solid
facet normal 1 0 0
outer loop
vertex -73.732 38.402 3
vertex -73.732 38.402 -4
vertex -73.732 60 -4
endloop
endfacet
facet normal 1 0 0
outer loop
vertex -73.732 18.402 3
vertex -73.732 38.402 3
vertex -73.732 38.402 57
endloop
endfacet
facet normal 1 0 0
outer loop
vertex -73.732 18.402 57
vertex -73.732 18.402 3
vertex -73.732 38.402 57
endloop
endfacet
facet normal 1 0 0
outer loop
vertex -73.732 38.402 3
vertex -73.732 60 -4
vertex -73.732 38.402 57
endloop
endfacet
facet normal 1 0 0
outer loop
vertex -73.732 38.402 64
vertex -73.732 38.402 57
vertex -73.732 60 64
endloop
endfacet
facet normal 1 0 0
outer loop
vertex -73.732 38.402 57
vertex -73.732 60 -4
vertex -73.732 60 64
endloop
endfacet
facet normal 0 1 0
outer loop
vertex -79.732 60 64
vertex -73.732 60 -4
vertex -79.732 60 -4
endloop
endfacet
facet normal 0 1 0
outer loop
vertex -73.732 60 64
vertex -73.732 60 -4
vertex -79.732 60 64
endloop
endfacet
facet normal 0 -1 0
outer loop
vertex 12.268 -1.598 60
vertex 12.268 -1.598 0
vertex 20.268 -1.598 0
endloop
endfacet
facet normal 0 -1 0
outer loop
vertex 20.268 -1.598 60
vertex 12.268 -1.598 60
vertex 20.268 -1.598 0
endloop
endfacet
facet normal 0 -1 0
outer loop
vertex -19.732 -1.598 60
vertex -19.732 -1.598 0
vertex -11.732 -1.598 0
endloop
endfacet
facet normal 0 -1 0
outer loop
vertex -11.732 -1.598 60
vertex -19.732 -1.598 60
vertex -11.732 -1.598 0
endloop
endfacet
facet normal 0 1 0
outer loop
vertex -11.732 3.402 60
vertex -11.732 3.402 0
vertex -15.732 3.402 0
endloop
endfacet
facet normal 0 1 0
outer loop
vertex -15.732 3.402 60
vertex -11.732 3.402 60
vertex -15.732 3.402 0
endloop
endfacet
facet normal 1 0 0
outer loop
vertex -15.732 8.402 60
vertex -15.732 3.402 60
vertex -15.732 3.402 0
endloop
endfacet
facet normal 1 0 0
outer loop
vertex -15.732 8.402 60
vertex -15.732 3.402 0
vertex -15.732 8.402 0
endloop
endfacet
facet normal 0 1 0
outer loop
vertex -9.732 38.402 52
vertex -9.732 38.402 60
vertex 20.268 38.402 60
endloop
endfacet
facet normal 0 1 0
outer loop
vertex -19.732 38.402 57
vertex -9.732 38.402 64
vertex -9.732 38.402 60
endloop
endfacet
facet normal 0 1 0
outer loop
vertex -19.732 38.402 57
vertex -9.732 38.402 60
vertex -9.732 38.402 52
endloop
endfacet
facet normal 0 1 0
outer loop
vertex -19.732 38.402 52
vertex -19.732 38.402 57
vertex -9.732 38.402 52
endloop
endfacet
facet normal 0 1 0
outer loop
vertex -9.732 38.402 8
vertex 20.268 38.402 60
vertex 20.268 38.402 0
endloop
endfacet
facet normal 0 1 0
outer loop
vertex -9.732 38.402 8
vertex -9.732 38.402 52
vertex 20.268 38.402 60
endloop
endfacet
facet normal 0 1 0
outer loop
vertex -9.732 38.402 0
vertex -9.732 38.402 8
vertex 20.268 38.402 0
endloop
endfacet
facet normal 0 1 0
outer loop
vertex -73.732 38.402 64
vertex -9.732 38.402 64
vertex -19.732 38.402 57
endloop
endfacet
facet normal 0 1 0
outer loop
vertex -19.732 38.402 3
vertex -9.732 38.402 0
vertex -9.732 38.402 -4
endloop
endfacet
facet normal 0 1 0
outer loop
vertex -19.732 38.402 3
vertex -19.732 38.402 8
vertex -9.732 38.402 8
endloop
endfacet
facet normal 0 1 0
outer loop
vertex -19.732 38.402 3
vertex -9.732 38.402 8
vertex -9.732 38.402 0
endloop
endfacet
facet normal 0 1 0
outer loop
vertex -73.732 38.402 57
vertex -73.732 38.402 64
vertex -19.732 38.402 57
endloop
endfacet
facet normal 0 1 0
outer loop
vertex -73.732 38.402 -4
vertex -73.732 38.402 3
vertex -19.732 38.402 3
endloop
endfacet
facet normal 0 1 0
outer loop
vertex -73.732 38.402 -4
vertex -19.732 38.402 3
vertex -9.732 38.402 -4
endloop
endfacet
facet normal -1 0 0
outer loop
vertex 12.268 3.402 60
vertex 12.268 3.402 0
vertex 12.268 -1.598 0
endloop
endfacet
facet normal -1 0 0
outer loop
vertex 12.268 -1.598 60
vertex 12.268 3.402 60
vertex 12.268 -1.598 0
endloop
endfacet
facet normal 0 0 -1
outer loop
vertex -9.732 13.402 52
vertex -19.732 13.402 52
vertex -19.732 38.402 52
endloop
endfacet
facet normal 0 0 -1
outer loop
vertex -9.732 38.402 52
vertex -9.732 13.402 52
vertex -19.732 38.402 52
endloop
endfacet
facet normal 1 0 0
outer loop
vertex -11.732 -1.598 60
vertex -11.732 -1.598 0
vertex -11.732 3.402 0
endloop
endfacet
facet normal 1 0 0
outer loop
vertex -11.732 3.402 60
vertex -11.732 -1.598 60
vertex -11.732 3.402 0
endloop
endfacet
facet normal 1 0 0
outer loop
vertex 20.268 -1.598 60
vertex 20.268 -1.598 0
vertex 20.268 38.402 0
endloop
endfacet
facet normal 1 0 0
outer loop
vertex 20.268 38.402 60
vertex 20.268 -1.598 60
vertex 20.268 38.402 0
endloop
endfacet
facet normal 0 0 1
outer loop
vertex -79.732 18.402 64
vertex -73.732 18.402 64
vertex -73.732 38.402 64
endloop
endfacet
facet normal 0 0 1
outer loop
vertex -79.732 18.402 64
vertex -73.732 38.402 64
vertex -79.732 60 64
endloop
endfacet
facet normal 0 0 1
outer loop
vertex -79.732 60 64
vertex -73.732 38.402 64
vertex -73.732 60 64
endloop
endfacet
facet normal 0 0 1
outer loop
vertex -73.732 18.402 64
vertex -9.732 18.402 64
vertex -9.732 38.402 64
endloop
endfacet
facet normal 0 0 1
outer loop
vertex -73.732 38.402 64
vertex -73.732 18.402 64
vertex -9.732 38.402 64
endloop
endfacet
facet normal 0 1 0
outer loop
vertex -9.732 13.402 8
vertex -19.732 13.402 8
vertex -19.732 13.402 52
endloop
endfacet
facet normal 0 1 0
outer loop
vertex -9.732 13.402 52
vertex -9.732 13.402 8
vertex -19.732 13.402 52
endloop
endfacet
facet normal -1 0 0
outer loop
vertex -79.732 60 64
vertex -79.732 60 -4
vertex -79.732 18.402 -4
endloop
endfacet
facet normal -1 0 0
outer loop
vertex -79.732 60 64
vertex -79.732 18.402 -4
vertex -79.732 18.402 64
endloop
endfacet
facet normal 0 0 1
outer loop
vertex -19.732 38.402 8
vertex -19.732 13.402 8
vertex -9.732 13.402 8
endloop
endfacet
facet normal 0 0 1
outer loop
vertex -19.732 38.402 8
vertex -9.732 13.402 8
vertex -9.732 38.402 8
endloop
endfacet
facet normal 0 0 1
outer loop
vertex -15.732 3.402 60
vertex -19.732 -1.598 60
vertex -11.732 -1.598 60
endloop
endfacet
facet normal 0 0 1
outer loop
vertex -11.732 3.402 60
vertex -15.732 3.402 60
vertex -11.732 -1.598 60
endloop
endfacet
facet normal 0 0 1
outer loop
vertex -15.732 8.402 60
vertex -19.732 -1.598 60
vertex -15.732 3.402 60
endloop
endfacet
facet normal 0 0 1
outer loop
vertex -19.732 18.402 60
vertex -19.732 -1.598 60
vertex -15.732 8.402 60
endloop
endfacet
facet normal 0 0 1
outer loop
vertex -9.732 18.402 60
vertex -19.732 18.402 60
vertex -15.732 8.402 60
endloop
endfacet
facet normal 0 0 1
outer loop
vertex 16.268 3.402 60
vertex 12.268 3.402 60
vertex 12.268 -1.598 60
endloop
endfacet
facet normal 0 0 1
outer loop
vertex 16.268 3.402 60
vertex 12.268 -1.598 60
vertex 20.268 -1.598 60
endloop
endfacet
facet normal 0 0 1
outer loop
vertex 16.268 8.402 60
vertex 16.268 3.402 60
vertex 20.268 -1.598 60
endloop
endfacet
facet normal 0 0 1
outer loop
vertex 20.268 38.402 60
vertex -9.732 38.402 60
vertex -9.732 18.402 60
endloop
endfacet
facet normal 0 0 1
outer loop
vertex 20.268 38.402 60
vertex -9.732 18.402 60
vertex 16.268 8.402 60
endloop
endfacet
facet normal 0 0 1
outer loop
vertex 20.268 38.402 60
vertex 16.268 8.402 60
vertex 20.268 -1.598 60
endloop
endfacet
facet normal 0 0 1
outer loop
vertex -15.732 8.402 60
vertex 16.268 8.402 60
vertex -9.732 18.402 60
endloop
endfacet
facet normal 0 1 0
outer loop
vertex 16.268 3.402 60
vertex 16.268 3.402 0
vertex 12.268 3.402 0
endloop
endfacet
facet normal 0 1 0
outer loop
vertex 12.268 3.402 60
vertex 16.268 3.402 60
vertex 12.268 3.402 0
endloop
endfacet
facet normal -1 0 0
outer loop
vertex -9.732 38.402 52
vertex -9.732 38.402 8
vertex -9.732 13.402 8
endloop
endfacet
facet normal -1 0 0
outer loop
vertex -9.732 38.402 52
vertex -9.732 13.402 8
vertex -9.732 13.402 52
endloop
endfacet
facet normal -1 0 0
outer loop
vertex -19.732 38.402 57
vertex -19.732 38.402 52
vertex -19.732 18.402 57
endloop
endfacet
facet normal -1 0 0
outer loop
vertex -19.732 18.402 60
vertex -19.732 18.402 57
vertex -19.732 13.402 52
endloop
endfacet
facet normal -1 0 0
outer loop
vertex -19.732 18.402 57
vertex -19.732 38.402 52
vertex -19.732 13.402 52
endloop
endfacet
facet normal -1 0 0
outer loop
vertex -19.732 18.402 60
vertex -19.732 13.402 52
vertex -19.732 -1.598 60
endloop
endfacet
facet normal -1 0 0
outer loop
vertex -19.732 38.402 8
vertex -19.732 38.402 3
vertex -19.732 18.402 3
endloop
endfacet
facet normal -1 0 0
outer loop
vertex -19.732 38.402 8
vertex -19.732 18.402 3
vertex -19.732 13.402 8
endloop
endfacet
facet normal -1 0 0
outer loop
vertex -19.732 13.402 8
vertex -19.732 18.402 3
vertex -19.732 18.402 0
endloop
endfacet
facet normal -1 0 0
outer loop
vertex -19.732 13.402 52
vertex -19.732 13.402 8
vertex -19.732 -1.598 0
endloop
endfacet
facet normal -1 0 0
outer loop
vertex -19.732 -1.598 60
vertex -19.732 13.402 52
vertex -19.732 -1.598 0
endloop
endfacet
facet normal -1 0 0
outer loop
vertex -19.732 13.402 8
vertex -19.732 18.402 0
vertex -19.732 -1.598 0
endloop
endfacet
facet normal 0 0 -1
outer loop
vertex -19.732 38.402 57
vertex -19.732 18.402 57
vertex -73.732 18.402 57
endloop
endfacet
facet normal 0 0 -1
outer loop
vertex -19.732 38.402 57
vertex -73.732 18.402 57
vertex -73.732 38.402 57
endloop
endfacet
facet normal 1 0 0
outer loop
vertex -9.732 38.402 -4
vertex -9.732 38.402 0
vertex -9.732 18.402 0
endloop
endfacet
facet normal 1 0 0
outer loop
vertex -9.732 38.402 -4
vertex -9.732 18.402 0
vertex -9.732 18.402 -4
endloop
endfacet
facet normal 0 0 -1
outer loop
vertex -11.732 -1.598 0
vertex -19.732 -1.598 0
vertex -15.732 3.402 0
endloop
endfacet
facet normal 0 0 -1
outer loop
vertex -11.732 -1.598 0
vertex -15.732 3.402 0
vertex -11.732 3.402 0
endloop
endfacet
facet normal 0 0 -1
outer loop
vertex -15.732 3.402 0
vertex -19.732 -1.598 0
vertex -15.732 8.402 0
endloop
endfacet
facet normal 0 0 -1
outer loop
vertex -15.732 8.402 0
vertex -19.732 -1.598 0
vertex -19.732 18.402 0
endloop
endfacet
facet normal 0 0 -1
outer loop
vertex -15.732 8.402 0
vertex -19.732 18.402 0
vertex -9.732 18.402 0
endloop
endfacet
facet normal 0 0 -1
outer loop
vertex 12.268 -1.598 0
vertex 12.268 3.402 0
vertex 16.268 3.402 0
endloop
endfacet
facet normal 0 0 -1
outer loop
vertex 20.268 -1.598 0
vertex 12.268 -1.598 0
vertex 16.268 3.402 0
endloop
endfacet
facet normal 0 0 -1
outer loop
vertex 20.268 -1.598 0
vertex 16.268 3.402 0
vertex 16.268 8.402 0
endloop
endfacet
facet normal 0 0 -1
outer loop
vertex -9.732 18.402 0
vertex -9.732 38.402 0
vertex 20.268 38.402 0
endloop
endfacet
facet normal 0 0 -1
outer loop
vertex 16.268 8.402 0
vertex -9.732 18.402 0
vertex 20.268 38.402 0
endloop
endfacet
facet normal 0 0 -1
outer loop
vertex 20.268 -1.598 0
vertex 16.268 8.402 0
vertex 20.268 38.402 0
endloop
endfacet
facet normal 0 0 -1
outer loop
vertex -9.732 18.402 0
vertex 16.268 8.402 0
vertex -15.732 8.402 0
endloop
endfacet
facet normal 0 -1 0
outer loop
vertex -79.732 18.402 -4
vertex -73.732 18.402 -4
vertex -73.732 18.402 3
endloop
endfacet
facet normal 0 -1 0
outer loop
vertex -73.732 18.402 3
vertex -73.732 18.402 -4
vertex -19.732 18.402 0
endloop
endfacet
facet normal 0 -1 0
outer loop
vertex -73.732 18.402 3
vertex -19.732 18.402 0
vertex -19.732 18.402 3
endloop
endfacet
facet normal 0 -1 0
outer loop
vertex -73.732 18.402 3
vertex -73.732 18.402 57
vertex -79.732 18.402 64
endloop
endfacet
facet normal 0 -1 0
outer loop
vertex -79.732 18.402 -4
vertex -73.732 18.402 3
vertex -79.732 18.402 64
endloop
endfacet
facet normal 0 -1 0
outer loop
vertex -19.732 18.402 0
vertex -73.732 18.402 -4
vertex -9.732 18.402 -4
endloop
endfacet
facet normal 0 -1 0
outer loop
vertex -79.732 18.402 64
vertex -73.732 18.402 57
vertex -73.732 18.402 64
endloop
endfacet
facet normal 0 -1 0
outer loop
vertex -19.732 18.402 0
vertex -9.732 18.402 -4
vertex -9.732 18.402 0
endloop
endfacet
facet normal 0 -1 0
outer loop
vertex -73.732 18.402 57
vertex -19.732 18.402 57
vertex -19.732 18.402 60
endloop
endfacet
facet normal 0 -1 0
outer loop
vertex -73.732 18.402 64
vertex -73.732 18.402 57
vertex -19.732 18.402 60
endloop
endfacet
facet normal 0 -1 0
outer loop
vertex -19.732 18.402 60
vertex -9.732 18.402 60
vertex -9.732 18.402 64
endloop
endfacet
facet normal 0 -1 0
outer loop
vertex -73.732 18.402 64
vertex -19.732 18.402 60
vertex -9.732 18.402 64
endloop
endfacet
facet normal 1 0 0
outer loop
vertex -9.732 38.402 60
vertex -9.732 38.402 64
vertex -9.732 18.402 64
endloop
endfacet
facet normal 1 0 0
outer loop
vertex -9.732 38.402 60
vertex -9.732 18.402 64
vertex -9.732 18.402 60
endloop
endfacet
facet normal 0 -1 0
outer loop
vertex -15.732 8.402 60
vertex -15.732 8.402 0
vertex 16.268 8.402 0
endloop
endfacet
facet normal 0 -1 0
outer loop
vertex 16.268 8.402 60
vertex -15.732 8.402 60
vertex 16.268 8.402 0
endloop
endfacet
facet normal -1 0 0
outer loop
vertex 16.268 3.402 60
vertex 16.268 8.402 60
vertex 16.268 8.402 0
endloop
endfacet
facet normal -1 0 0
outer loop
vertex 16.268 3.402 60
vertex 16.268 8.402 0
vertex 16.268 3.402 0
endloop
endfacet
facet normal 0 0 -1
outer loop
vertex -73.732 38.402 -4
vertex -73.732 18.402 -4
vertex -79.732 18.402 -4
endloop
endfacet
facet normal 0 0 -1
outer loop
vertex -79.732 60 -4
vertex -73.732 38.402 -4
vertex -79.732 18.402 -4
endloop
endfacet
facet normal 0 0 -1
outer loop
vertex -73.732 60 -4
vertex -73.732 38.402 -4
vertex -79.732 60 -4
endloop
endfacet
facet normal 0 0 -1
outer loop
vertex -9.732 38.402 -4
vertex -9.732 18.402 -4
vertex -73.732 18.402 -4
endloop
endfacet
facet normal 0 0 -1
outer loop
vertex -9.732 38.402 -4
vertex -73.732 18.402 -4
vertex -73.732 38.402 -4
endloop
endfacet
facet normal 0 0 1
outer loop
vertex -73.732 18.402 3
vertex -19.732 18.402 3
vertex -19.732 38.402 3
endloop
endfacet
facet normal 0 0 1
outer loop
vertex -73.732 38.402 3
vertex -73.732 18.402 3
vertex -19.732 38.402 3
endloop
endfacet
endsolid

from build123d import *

# Parameters (mm, degrees)
EXTRUDE_1_DEPTH     = 60
SKETCH_2_W          = 7
SKETCH_2_H          = 20
EXTRUDE_2_DEPTH     = 54
SKETCH_3_W          = 4
SKETCH_3_H          = 20
EXTRUDE_3_DEPTH     = 10
SKETCH_4_W          = 68
SKETCH_4_H          = 41.598220465
EXTRUDE_4_DEPTH     = 6
SKETCH_5_W          = 44
SKETCH_5_H          = 25.180333828
CUT_EXTRUDE_1_DEPTH = 10


with BuildPart() as part:
    # 草图1 → 凸台-拉伸1 (new body)
    with BuildSketch(Plane.XY):
        Polygon((-19.732146976, -1.598220465), (-11.732146976, -1.598220465), (-11.732146976, 3.401779535), (-15.732146976, 3.401779535), (-15.732146976, 8.401779535), (16.267853024, 8.401779535), (16.267853024, 3.401779535), (12.267853024, 3.401779535), (12.267853024, -1.598220465), (20.267853024, -1.598220465), (20.267853024, 38.401779535), (-19.732146976, 38.401779535), align=None)
    extrude(amount=EXTRUDE_1_DEPTH)

    # 草图2 → 凸台-拉伸2 (add)
    with BuildSketch(Plane.ZY.offset(19.732146976)):
        with Locations((-0.5, 28.401779535)):
            Rectangle(SKETCH_2_W, SKETCH_2_H)
        with Locations((60.5, 28.401779535)):
            Rectangle(SKETCH_2_W, SKETCH_2_H)
    extrude(amount=EXTRUDE_2_DEPTH)

    # 草图3 → 凸台-拉伸3 (add)
    with BuildSketch(Plane(origin=(-19.732146976, 0, 0), x_dir=(0, 0, -1), z_dir=(1, 0, 0))):
        with Locations((-62, 28.401779535)):
            Rectangle(SKETCH_3_W, SKETCH_3_H)
        with Locations((2, 28.401779535)):
            Rectangle(SKETCH_3_W, SKETCH_3_H)
    extrude(amount=EXTRUDE_3_DEPTH)

    # 草图4 → 凸台-拉伸4 (add)
    with BuildSketch(Plane.ZY.offset(73.732146976)):
        with Locations((30, 39.200889768)):
            Rectangle(SKETCH_4_W, SKETCH_4_H)
    extrude(amount=EXTRUDE_4_DEPTH)

    # 草图5 → 切除-拉伸1 (cut)
    with BuildSketch(Plane.ZY.offset(19.732146976)):
        with Locations((30, 25.991946449)):
            Rectangle(SKETCH_5_W, SKETCH_5_H)
    extrude(amount=-CUT_EXTRUDE_1_DEPTH, mode=Mode.SUBTRACT)


solid = part.part
